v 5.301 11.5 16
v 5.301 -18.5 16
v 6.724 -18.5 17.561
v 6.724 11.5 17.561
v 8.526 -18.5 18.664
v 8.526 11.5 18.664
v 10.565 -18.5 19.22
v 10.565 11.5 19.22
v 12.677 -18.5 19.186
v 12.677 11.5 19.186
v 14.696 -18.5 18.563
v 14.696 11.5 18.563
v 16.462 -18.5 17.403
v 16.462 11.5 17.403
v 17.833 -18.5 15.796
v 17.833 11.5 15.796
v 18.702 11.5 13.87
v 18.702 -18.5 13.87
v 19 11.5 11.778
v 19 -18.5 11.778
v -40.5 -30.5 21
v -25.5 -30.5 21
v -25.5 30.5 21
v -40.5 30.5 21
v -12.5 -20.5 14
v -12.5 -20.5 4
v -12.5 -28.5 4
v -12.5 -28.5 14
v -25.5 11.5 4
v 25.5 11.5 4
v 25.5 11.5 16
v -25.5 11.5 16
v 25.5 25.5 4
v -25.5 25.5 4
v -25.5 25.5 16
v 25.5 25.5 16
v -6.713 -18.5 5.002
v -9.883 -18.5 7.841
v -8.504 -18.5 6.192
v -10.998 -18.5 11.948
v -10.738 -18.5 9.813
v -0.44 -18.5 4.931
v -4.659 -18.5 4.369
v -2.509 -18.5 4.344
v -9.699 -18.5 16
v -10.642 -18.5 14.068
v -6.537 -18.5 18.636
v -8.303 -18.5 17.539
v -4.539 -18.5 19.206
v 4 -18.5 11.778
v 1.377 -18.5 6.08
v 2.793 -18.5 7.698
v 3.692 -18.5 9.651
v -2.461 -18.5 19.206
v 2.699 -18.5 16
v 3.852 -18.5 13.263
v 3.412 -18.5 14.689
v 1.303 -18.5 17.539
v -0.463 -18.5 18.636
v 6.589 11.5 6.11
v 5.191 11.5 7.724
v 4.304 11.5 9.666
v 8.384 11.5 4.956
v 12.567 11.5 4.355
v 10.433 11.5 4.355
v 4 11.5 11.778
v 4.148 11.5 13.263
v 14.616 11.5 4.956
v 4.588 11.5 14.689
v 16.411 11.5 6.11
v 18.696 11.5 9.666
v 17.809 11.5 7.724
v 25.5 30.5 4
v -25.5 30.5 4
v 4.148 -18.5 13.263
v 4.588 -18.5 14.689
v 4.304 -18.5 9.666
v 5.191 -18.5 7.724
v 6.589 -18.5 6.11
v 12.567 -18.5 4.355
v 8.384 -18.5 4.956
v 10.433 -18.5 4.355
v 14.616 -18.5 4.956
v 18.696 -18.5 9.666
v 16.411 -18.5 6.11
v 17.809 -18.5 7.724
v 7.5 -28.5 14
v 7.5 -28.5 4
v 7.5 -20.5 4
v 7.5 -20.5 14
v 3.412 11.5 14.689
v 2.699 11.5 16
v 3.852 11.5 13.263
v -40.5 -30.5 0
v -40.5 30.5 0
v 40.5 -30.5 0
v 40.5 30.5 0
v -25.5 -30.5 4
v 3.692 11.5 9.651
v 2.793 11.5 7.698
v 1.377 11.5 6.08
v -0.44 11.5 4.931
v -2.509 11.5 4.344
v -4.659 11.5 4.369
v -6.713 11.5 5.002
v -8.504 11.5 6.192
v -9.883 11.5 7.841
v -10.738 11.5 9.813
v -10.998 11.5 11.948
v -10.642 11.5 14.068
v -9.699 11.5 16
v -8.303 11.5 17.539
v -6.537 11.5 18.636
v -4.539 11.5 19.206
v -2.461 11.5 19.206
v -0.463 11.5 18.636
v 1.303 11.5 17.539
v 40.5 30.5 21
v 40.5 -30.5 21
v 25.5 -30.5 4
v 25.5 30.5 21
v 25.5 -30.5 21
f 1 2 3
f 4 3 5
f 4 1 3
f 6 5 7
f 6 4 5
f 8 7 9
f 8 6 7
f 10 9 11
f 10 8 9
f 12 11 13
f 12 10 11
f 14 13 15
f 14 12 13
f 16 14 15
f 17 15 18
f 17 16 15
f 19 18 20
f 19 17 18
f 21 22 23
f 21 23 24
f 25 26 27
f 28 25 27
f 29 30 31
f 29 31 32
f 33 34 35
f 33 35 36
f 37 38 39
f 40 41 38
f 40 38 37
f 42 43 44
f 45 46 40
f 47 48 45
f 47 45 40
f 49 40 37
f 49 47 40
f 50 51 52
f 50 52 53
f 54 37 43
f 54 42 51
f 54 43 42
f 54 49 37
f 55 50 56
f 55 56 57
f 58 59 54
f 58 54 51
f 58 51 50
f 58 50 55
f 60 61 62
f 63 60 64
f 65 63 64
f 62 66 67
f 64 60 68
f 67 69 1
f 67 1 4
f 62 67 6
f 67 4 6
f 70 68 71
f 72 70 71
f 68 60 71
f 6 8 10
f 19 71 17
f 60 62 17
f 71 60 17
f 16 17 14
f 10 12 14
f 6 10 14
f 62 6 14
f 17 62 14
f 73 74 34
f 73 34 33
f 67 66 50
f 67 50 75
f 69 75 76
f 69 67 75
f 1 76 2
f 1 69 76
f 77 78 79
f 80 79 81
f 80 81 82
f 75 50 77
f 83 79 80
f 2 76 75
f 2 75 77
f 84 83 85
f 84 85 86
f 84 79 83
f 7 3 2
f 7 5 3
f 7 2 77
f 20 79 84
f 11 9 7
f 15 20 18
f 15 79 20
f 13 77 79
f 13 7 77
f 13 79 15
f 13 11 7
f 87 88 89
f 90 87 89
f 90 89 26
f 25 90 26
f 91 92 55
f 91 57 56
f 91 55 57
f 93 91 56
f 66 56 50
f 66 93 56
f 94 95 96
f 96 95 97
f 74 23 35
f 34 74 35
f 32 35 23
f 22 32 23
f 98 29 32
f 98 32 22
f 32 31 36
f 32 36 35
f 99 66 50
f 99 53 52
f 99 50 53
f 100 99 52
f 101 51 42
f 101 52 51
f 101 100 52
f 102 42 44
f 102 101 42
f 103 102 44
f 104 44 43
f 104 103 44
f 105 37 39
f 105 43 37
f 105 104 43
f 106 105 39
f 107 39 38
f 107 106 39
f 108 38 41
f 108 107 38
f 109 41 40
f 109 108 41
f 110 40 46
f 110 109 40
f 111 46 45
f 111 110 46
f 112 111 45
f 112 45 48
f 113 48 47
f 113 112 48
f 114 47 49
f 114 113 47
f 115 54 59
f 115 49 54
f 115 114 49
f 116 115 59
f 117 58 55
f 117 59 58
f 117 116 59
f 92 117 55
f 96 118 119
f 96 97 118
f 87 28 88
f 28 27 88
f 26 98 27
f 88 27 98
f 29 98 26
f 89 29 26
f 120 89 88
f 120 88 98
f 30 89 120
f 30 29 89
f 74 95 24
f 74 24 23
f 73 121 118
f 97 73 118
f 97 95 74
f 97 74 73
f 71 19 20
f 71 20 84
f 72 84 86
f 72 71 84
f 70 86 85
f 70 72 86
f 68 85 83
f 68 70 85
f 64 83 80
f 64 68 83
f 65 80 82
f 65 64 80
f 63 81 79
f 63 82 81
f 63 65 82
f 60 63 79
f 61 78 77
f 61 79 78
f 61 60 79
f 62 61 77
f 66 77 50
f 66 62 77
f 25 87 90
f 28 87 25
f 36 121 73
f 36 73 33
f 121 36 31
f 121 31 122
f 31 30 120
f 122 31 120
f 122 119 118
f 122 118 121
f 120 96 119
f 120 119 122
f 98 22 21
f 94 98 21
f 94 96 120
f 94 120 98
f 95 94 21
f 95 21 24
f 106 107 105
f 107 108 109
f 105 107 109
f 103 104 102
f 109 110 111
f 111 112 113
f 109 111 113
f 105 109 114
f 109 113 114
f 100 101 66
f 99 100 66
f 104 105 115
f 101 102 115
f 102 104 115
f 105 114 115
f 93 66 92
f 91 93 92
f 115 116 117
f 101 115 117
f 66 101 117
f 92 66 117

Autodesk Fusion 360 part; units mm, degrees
sketch "Sketch1" plane through (0, 0, 0) normal (0, 0, 1) x (1, 0, 0)
  line L0 (40.5, -30.5) -> (-40.5, -30.5)
  line L1 (-40.5, -30.5) -> (-40.5, 30.5)
  line L2 (-40.5, 30.5) -> (40.5, 30.5)
  line L3 (40.5, 30.5) -> (40.5, -30.5)
  line L4 (40.5, -30.5) -> (-40.5, 30.5) construction
  line L5 (-40.5, -30.5) -> (40.5, 30.5) construction
  dimension "d1" = 81
  dimension "d2" = 61
extrude "Extrude1" add sketch "Sketch1" along normal blind 4 makes body 1
sketch "Sketch2" plane through (0, 0, 4) normal (0, 0, 1) x (-1, 0, 0)
  line L0 (-40.5, -30.5) -> (40.5, -30.5)
  line L1 (40.5, -30.5) -> (40.5, 30.5)
  line L2 (40.5, 30.5) -> (-40.5, 30.5)
  line L3 (-40.5, 30.5) -> (-40.5, -30.5)
  line L4 (40.5, -30.5) -> (25.5, -30.5)
  line L5 (25.5, -30.5) -> (25.5, 30.5)
  line L6 (25.5, 30.5) -> (40.5, 30.5)
  line L7 (40.5, 30.5) -> (40.5, -30.5)
  line L8 (0, -30.5) -> (0, 30) construction
  line L9 (-25.5, -30.5) -> (-25.5, 30.5)
  line L10 (-40.5, -30.5) -> (-25.5, -30.5)
  line L11 (-40.5, 30.5) -> (-40.5, -30.5)
  line L12 (-25.5, 30.5) -> (-40.5, 30.5)
  dimension "d5" = 15
extrude "Extrude2" add sketch "Sketch2" along normal blind 17 contours L0 L2 L3 L9 L10 L11 L12 | L0 L1 L2 L4 L5 L6 L7 bodies 1
sketch "Sketch3" plane through (0, 0, 4) normal (0, 0, 1) x (-1, 0, 0)
  line L0 (-25.5, 30.5) -> (-25.5, -30.5)
  line L1 (-25.5, -30.5) -> (25.5, -30.5)
  line L2 (25.5, -30.5) -> (25.5, 30.5)
  line L3 (25.5, 30.5) -> (-25.5, 30.5)
  line L4 (12.5, 28.5) -> (-7.5, 28.5)
  line L5 (-7.5, 28.5) -> (-7.5, 20.5)
  line L6 (-7.5, 20.5) -> (12.5, 20.5)
  line L7 (12.5, 20.5) -> (12.5, 28.5)
  line L8 (25.5, -25.5) -> (-25.5, -25.5)
  line L9 (-25.5, -25.5) -> (-25.5, -11.5)
  line L10 (-25.5, -11.5) -> (25.5, -11.5)
  line L11 (25.5, -11.5) -> (25.5, -25.5)
  dimension "d8" = 20
  dimension "d9" = 8
  dimension "d10" = 2
  dimension "d11" = 18
  dimension "d12" = 14
  dimension "d13" = 5
extrude "Extrude3" add sketch "Sketch3" along normal blind 10 contours L4 L5 L6 L7 bodies 1
extrude "Extrude4" add sketch "Sketch3" along normal blind 12 contours L0 L2 L8 L9 L10 L11 bodies 1
sketch "Sketch5" plane through (0, 11.5, 0) normal (0, -1, 0) x (1, 0, 0)
  line L0 (-25.5, 4) -> (25.5, 4)
  line L1 (25.5, 4) -> (25.5, 16)
  line L2 (25.5, 16) -> (-25.5, 16)
  line L3 (-25.5, 16) -> (-25.5, 4)
  circle A0 centre (11.5, 11.7785) radius 7.5
  circle A1 centre (-3.5, 11.7785) radius 7.5
  dimension "d18" = 15
  dimension "d19" = 14
  dimension "d20" = 15
extrude "Extrude5" add sketch "Sketch5" along normal blind 30 separate body contours L2 A1 | L2 A1 | L2 A0 | L2 A0 makes body 2 at (-10.9631, -8.5, 12.5217)
